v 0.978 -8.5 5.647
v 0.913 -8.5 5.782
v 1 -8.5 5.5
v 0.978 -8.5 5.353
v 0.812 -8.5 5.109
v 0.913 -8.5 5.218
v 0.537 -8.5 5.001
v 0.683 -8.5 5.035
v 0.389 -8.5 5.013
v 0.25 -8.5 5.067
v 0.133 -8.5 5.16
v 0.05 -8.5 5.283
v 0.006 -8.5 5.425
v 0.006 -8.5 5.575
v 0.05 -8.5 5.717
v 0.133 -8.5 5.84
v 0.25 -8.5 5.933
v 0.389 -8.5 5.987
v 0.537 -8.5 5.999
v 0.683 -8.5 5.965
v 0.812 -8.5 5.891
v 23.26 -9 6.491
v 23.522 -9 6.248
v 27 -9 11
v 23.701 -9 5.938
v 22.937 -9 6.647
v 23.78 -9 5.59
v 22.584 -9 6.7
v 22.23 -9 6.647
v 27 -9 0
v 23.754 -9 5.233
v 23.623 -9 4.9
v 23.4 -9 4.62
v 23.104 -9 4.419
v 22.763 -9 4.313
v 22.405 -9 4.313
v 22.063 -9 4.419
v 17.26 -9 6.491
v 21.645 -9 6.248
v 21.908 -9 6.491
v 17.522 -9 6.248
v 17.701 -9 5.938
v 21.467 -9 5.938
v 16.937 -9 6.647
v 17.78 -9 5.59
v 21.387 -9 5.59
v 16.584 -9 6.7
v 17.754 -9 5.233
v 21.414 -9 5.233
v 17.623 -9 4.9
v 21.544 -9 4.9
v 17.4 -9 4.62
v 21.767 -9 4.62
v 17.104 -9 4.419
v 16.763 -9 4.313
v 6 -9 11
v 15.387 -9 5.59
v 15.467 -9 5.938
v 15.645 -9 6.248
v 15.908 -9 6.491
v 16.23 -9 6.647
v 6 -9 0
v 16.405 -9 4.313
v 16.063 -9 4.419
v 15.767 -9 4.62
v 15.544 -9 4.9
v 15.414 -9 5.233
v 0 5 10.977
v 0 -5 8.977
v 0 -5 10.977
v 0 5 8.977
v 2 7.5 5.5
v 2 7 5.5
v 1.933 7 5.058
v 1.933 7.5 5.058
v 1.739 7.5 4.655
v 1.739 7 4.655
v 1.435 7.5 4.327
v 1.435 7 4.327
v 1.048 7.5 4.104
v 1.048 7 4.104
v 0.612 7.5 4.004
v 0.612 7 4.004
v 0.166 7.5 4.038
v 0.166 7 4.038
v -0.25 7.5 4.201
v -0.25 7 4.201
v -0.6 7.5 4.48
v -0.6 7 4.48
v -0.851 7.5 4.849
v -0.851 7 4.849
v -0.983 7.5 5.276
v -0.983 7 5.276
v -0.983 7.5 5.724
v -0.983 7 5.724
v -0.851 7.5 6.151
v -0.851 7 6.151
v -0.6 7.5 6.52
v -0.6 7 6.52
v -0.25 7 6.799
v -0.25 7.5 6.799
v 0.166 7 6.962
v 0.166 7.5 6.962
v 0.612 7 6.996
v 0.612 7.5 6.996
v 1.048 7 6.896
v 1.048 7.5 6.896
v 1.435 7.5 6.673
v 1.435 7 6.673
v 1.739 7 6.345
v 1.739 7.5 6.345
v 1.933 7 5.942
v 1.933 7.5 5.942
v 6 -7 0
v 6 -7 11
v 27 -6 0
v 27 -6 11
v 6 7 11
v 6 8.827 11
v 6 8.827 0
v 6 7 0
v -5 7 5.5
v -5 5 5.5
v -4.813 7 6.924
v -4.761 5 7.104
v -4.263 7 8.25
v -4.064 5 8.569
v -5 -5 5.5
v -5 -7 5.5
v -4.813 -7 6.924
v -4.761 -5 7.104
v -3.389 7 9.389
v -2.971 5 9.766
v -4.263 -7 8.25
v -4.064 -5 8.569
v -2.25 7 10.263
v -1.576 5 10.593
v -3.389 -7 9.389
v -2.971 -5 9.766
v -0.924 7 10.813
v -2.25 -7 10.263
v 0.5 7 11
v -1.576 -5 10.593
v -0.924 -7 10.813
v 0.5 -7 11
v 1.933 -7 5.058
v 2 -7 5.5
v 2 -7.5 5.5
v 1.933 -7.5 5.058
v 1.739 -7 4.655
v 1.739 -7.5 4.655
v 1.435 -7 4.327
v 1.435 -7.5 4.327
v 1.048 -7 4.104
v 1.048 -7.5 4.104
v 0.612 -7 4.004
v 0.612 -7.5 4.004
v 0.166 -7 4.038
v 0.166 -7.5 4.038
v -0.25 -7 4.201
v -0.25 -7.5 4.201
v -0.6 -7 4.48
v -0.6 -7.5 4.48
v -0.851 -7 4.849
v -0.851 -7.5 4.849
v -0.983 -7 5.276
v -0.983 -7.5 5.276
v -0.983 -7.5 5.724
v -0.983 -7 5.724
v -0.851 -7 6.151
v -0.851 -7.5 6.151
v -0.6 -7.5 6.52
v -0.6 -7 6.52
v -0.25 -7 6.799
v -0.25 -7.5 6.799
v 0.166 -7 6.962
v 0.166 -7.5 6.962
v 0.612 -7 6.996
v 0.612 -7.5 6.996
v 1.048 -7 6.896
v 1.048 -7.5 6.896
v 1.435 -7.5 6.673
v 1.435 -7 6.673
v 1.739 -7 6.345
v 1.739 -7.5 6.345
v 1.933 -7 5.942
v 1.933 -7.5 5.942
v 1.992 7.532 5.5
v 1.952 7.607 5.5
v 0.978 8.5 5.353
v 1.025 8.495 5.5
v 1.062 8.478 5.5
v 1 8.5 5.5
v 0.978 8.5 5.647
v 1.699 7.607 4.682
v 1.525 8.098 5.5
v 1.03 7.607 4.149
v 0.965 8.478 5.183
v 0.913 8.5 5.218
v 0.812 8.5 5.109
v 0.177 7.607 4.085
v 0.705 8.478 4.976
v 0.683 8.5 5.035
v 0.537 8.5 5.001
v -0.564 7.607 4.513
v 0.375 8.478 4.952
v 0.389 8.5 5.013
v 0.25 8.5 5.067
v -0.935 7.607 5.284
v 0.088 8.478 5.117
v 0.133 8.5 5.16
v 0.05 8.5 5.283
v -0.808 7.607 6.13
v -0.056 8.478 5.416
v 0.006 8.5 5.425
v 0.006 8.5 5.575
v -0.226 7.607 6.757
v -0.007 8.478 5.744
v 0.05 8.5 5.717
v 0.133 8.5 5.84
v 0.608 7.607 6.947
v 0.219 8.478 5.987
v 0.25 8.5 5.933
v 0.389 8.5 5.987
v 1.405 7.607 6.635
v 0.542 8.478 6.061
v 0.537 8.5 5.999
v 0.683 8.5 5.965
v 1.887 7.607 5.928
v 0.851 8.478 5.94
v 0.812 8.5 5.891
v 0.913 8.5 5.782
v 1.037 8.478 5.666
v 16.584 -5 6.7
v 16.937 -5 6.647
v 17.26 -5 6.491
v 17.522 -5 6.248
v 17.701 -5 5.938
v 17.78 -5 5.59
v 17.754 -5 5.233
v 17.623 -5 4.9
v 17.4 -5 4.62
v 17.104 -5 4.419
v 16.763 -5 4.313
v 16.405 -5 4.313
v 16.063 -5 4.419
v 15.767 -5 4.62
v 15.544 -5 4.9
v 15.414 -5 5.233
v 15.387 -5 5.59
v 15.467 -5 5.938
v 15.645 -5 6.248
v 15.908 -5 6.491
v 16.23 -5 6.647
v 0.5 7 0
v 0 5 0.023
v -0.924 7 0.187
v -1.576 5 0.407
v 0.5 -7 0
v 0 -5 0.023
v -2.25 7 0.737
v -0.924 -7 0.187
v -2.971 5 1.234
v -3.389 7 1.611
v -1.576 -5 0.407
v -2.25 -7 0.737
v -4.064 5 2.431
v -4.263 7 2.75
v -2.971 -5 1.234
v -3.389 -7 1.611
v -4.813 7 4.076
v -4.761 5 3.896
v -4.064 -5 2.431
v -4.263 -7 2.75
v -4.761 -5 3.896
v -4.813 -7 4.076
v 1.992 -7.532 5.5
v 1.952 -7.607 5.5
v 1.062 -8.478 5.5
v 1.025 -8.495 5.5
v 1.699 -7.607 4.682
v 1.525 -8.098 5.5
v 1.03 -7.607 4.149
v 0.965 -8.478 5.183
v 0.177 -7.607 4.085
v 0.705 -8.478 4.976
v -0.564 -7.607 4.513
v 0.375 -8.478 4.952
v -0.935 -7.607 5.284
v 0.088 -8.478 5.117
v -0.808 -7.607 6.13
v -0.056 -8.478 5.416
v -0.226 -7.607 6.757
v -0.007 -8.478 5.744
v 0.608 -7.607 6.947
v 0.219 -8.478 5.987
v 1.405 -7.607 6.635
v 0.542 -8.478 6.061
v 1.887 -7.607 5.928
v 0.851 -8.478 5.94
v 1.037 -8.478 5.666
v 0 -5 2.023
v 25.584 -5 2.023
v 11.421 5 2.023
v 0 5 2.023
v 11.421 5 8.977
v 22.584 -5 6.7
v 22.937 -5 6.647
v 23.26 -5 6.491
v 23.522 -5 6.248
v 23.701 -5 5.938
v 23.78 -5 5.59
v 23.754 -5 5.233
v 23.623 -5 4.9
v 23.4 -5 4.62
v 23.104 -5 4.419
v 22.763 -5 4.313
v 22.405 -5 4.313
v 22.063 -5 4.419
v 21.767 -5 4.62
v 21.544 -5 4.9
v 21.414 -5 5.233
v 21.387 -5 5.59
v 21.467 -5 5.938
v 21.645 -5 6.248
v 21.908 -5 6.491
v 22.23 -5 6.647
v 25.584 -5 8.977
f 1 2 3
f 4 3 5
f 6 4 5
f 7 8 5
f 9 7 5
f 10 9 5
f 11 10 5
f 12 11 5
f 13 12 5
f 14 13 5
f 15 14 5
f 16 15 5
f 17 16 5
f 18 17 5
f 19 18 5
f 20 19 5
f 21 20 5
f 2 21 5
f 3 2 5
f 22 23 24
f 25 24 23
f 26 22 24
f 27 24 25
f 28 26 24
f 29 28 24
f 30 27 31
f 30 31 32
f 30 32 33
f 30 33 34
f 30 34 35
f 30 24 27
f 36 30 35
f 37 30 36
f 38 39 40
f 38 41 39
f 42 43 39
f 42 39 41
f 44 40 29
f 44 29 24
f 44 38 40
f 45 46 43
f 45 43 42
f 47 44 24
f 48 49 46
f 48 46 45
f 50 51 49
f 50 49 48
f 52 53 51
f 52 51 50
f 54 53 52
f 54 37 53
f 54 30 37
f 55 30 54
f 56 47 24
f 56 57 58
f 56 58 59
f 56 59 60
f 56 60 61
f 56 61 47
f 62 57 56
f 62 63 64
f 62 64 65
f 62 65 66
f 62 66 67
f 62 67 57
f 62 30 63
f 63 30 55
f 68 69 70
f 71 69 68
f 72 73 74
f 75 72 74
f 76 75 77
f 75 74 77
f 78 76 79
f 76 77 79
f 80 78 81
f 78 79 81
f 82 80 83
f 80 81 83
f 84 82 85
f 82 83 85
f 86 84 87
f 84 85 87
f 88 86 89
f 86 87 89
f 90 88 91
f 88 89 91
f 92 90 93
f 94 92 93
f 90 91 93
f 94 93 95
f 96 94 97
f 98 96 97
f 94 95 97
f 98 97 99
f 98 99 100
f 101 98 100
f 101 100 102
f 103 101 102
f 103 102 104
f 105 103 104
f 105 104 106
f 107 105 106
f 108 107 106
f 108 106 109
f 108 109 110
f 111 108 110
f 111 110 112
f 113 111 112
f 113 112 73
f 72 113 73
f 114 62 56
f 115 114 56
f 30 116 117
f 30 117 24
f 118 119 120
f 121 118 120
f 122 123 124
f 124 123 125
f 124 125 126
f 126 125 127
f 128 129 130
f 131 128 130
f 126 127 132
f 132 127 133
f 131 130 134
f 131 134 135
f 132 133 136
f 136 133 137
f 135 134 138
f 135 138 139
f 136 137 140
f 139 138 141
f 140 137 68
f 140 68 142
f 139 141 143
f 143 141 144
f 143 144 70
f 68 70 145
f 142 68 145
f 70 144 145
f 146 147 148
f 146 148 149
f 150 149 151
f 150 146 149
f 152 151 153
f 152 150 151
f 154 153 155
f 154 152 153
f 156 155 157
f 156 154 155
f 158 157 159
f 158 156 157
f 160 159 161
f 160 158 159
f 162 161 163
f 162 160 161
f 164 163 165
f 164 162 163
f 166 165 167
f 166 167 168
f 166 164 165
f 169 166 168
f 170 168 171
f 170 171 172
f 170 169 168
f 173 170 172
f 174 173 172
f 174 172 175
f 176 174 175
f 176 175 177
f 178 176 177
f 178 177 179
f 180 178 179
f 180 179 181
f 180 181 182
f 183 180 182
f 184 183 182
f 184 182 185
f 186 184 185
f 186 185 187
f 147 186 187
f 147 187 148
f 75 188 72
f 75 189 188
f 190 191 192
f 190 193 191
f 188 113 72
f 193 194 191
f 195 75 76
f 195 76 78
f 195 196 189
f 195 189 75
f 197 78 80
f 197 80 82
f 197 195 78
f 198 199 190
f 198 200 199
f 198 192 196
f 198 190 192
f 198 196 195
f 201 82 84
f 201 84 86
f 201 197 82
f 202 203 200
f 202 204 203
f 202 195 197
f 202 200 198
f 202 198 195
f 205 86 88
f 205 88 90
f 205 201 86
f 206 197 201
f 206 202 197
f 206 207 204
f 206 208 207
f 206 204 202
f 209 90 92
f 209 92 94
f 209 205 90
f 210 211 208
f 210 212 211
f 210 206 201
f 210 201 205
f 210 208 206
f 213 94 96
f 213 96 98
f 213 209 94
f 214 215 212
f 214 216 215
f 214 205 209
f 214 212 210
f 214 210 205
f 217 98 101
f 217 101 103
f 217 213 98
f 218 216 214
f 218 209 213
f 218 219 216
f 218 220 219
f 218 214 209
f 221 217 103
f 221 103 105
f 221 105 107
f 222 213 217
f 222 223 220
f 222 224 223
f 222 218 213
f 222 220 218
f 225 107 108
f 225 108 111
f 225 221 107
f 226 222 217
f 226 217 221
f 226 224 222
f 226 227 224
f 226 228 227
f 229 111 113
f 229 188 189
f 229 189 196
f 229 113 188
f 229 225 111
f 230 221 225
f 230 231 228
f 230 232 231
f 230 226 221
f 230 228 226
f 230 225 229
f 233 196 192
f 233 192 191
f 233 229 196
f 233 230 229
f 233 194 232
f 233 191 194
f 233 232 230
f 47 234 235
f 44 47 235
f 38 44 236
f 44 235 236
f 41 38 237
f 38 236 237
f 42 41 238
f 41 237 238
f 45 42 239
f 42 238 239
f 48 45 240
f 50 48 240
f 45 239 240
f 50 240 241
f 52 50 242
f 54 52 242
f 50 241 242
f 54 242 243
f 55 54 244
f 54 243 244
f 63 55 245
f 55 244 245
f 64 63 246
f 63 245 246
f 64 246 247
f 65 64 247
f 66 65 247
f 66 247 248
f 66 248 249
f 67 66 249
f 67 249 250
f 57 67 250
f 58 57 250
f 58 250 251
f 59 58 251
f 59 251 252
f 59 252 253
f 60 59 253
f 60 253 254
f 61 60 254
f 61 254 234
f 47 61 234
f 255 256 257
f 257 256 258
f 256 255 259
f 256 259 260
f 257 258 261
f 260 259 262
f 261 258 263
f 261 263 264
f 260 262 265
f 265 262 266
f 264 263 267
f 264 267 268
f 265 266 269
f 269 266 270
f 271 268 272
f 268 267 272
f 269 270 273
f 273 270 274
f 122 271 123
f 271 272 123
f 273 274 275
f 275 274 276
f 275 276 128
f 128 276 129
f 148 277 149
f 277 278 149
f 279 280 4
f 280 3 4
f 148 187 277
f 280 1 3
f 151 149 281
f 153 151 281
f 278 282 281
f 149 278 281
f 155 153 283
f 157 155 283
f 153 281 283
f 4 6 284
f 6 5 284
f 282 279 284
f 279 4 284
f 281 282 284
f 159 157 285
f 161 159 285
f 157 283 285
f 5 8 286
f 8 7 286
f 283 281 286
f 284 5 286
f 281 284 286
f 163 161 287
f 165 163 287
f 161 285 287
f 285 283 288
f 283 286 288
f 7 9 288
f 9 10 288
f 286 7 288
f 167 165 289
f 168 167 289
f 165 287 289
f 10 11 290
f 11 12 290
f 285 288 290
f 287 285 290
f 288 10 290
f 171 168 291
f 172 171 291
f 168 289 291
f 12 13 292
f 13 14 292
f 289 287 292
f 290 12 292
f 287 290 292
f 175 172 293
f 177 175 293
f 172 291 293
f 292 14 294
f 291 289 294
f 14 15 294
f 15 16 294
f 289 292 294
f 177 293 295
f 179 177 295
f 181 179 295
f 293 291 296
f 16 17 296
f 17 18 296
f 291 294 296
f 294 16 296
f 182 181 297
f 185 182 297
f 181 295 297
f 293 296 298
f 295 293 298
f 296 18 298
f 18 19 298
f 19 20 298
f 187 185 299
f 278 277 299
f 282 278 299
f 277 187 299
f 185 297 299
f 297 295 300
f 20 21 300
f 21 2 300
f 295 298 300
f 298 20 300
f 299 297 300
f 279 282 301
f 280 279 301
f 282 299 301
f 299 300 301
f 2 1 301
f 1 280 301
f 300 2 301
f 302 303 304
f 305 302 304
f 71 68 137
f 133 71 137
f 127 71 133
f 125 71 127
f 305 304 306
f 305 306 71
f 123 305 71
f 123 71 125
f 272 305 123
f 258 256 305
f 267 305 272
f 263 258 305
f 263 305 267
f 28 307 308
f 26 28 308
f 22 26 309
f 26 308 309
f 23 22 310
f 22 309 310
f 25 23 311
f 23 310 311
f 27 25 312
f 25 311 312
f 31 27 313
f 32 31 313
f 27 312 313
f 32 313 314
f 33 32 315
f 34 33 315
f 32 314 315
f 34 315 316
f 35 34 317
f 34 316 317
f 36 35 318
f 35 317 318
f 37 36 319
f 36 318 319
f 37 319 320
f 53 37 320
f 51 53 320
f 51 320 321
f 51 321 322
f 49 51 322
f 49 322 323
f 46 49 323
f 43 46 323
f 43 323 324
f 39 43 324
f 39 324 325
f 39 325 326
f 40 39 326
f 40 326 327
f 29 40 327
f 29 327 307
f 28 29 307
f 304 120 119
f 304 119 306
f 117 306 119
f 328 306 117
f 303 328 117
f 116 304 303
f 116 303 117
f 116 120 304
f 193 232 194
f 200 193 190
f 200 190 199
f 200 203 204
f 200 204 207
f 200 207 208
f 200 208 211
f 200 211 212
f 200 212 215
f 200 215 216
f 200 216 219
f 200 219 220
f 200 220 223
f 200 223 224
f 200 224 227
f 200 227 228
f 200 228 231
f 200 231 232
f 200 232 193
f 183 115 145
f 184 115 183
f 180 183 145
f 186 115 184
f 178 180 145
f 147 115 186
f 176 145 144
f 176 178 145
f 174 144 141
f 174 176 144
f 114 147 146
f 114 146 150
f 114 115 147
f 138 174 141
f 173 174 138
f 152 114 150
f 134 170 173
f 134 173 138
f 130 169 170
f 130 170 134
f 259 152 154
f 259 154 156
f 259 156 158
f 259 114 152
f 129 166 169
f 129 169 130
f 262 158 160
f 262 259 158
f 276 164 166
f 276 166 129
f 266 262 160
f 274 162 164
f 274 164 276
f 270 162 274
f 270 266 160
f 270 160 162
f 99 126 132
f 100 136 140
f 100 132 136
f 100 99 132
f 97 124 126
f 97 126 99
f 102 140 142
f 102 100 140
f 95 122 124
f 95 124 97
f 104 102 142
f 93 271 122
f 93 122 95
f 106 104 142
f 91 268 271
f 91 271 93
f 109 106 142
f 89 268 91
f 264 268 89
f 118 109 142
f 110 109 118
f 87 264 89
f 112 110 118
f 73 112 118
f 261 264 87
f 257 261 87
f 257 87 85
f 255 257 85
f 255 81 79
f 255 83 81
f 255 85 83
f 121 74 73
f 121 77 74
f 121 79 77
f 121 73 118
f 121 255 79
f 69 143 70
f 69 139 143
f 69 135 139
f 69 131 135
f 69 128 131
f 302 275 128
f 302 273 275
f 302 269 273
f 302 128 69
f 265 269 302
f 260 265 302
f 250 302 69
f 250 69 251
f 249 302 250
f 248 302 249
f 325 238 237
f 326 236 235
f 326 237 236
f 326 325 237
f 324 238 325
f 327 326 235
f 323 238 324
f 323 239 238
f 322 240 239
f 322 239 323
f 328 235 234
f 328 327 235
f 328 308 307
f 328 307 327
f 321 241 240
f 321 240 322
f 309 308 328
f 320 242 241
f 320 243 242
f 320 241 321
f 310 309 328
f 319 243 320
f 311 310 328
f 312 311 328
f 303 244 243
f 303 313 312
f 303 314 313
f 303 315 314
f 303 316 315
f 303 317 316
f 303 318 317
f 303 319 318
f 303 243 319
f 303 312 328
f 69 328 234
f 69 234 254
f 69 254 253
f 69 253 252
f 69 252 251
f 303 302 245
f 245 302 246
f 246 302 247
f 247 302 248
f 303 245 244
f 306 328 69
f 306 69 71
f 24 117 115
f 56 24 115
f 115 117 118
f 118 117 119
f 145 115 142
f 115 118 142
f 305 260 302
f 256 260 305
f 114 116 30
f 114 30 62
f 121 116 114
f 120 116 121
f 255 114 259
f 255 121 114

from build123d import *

# Parameters (mm, degrees)
SALIENTE_EXTRUIR1_DEPTH = 11
CORTAR_EXTRUIR1_DEPTH   = 61
CROQUIS3_W              = 6.95445115
CROQUIS3_H              = 10
CORTAR_EXTRUIR2_DEPTH   = 61
CROQUIS4_R              = 1.2
CORTAR_EXTRUIR3_DEPTH   = 61
CROQUIS5_R              = 1.5
SALIENTE_EXTRUIR2_DEPTH = 1.5
REDONDEO2_SIZE          = 1
REDONDEO6_SIZE          = 1
CROQUIS6_W              = 1
CROQUIS6_H              = 11
CORTAR_EXTRUIR4_DEPTH   = 2
CROQUIS7_W              = 1
CROQUIS7_H              = 11
CORTAR_EXTRUIR5_DEPTH   = 2


with BuildPart() as part:
    # Croquis1 → Saliente-Extruir1 (new body)
    with BuildSketch(Plane.XY):
        Polygon((-5, 7), (5, 7), (5, 9), (5.755229402, 9), (27, -6), (27, -9), (5, -9), (5, -7), (-5, -7), (-5, -5), (0, -5), (0, 5), (-5, 5), align=None)
    extrude(amount=SALIENTE_EXTRUIR1_DEPTH)

    # Croquis2 → Cortar-Extruir1 (cut)
    with BuildSketch(Plane.XZ.offset(7)):
        with BuildLine():
            ThreePointArc((-5, 5.5), (-3.389087297, 9.389087297), (0.5, 11))
            Line((0.5, 11), (-5, 11))
            Line((-5, 11), (-5, 5.5))
        make_face()
        with BuildLine():
            ThreePointArc((0.5, 0), (-3.389087297, 1.610912703), (-5, 5.5))
            Line((-5, 5.5), (-5, 0))
            Line((-5, 0), (0.5, 0))
        make_face()
    extrude(amount=-CORTAR_EXTRUIR1_DEPTH, mode=Mode.SUBTRACT)

    # Croquis3 → Cortar-Extruir2 (cut)
    with BuildSketch(Plane.ZY):
        with Locations((5.5, 0)):
            Rectangle(CROQUIS3_W, CROQUIS3_H)
    extrude(amount=-CORTAR_EXTRUIR2_DEPTH, mode=Mode.SUBTRACT)

    # Croquis4 → Cortar-Extruir3 (cut)
    with BuildSketch(Plane(origin=(0, -5, 0), x_dir=(1, 0, 0), z_dir=(0, 1, 0))):
        with Locations(Location((22.58368196, -5.5, 0), (0, 0, 270))):
            Circle(CROQUIS4_R)
        with Locations(Location((16.58368196, -5.5, 0), (0, 0, 270))):
            Circle(CROQUIS4_R)
    extrude(amount=-CORTAR_EXTRUIR3_DEPTH, mode=Mode.SUBTRACT)

    # Croquis5 → Saliente-Extruir2 (add)
    with BuildSketch(Plane(origin=(0, 7, 0), x_dir=(1, 0, 0), z_dir=(0, 1, 0))):
        with Locations((0.5, -5.5)):
            Circle(CROQUIS5_R)
    saliente_extruir2 = extrude(amount=SALIENTE_EXTRUIR2_DEPTH)

    # Simetría4: Saliente-Extruir2 across plane
    add(saliente_extruir2.mirror(Plane.ZX))

    # Redondeo2
    # a fillet whose section is not a circle: 1 mm, written as the material it takes off along each edge
    with BuildSketch(Plane(origin=(0.5, 8.5, 5.5), x_dir=(1, 0, 0), z_dir=(0, 0, 1))) as redondeo2_piece_1:
        with BuildLine():
            Bezier((1.5, -REDONDEO2_SIZE), (1.5, 0), (1.5 - REDONDEO2_SIZE, 0), weights=[1, 0.141421356, 1])
            Line((1.5 - REDONDEO2_SIZE, 0), (1.5, 0))
            Line((1.5, 0), (1.5, -REDONDEO2_SIZE))
        make_face()
    revolve(axis=Axis((0.5, 8.5, 5.5), (0, 1, 0)), mode=Mode.SUBTRACT)

    # Redondeo6
    # a fillet whose section is not a circle: 1 mm, written as the material it takes off along each edge
    with BuildSketch(Plane(origin=(0.5, -8.5, 5.5), x_dir=(1, 0, 0), z_dir=(0, 0, 1))) as redondeo6_piece_1:
        with BuildLine():
            Bezier((1.5, REDONDEO6_SIZE), (1.5, 0), (1.5 - REDONDEO6_SIZE, 0), weights=[1, 0.141421356, 1])
            Line((1.5 - REDONDEO6_SIZE, 0), (1.5, 0))
            Line((1.5, 0), (1.5, REDONDEO6_SIZE))
        make_face()
    revolve(axis=Axis((0.5, -8.5, 5.5), (0, 1, 0)), mode=Mode.SUBTRACT)

    # Croquis6 → Cortar-Extruir4 (cut)
    with BuildSketch(Plane(origin=(0, 9, 0), x_dir=(1, 0, 0), z_dir=(0, 1, 0))):
        with Locations((5.5, -5.5)):
            Rectangle(CROQUIS6_W, CROQUIS6_H)
    extrude(amount=-CORTAR_EXTRUIR4_DEPTH, mode=Mode.SUBTRACT)

    # Croquis7 → Cortar-Extruir5 (cut)
    with BuildSketch(Plane.XZ.offset(9)):
        with Locations((5.5, 5.5)):
            Rectangle(CROQUIS7_W, CROQUIS7_H)
    extrude(amount=-CORTAR_EXTRUIR5_DEPTH, mode=Mode.SUBTRACT)


solid = part.part
